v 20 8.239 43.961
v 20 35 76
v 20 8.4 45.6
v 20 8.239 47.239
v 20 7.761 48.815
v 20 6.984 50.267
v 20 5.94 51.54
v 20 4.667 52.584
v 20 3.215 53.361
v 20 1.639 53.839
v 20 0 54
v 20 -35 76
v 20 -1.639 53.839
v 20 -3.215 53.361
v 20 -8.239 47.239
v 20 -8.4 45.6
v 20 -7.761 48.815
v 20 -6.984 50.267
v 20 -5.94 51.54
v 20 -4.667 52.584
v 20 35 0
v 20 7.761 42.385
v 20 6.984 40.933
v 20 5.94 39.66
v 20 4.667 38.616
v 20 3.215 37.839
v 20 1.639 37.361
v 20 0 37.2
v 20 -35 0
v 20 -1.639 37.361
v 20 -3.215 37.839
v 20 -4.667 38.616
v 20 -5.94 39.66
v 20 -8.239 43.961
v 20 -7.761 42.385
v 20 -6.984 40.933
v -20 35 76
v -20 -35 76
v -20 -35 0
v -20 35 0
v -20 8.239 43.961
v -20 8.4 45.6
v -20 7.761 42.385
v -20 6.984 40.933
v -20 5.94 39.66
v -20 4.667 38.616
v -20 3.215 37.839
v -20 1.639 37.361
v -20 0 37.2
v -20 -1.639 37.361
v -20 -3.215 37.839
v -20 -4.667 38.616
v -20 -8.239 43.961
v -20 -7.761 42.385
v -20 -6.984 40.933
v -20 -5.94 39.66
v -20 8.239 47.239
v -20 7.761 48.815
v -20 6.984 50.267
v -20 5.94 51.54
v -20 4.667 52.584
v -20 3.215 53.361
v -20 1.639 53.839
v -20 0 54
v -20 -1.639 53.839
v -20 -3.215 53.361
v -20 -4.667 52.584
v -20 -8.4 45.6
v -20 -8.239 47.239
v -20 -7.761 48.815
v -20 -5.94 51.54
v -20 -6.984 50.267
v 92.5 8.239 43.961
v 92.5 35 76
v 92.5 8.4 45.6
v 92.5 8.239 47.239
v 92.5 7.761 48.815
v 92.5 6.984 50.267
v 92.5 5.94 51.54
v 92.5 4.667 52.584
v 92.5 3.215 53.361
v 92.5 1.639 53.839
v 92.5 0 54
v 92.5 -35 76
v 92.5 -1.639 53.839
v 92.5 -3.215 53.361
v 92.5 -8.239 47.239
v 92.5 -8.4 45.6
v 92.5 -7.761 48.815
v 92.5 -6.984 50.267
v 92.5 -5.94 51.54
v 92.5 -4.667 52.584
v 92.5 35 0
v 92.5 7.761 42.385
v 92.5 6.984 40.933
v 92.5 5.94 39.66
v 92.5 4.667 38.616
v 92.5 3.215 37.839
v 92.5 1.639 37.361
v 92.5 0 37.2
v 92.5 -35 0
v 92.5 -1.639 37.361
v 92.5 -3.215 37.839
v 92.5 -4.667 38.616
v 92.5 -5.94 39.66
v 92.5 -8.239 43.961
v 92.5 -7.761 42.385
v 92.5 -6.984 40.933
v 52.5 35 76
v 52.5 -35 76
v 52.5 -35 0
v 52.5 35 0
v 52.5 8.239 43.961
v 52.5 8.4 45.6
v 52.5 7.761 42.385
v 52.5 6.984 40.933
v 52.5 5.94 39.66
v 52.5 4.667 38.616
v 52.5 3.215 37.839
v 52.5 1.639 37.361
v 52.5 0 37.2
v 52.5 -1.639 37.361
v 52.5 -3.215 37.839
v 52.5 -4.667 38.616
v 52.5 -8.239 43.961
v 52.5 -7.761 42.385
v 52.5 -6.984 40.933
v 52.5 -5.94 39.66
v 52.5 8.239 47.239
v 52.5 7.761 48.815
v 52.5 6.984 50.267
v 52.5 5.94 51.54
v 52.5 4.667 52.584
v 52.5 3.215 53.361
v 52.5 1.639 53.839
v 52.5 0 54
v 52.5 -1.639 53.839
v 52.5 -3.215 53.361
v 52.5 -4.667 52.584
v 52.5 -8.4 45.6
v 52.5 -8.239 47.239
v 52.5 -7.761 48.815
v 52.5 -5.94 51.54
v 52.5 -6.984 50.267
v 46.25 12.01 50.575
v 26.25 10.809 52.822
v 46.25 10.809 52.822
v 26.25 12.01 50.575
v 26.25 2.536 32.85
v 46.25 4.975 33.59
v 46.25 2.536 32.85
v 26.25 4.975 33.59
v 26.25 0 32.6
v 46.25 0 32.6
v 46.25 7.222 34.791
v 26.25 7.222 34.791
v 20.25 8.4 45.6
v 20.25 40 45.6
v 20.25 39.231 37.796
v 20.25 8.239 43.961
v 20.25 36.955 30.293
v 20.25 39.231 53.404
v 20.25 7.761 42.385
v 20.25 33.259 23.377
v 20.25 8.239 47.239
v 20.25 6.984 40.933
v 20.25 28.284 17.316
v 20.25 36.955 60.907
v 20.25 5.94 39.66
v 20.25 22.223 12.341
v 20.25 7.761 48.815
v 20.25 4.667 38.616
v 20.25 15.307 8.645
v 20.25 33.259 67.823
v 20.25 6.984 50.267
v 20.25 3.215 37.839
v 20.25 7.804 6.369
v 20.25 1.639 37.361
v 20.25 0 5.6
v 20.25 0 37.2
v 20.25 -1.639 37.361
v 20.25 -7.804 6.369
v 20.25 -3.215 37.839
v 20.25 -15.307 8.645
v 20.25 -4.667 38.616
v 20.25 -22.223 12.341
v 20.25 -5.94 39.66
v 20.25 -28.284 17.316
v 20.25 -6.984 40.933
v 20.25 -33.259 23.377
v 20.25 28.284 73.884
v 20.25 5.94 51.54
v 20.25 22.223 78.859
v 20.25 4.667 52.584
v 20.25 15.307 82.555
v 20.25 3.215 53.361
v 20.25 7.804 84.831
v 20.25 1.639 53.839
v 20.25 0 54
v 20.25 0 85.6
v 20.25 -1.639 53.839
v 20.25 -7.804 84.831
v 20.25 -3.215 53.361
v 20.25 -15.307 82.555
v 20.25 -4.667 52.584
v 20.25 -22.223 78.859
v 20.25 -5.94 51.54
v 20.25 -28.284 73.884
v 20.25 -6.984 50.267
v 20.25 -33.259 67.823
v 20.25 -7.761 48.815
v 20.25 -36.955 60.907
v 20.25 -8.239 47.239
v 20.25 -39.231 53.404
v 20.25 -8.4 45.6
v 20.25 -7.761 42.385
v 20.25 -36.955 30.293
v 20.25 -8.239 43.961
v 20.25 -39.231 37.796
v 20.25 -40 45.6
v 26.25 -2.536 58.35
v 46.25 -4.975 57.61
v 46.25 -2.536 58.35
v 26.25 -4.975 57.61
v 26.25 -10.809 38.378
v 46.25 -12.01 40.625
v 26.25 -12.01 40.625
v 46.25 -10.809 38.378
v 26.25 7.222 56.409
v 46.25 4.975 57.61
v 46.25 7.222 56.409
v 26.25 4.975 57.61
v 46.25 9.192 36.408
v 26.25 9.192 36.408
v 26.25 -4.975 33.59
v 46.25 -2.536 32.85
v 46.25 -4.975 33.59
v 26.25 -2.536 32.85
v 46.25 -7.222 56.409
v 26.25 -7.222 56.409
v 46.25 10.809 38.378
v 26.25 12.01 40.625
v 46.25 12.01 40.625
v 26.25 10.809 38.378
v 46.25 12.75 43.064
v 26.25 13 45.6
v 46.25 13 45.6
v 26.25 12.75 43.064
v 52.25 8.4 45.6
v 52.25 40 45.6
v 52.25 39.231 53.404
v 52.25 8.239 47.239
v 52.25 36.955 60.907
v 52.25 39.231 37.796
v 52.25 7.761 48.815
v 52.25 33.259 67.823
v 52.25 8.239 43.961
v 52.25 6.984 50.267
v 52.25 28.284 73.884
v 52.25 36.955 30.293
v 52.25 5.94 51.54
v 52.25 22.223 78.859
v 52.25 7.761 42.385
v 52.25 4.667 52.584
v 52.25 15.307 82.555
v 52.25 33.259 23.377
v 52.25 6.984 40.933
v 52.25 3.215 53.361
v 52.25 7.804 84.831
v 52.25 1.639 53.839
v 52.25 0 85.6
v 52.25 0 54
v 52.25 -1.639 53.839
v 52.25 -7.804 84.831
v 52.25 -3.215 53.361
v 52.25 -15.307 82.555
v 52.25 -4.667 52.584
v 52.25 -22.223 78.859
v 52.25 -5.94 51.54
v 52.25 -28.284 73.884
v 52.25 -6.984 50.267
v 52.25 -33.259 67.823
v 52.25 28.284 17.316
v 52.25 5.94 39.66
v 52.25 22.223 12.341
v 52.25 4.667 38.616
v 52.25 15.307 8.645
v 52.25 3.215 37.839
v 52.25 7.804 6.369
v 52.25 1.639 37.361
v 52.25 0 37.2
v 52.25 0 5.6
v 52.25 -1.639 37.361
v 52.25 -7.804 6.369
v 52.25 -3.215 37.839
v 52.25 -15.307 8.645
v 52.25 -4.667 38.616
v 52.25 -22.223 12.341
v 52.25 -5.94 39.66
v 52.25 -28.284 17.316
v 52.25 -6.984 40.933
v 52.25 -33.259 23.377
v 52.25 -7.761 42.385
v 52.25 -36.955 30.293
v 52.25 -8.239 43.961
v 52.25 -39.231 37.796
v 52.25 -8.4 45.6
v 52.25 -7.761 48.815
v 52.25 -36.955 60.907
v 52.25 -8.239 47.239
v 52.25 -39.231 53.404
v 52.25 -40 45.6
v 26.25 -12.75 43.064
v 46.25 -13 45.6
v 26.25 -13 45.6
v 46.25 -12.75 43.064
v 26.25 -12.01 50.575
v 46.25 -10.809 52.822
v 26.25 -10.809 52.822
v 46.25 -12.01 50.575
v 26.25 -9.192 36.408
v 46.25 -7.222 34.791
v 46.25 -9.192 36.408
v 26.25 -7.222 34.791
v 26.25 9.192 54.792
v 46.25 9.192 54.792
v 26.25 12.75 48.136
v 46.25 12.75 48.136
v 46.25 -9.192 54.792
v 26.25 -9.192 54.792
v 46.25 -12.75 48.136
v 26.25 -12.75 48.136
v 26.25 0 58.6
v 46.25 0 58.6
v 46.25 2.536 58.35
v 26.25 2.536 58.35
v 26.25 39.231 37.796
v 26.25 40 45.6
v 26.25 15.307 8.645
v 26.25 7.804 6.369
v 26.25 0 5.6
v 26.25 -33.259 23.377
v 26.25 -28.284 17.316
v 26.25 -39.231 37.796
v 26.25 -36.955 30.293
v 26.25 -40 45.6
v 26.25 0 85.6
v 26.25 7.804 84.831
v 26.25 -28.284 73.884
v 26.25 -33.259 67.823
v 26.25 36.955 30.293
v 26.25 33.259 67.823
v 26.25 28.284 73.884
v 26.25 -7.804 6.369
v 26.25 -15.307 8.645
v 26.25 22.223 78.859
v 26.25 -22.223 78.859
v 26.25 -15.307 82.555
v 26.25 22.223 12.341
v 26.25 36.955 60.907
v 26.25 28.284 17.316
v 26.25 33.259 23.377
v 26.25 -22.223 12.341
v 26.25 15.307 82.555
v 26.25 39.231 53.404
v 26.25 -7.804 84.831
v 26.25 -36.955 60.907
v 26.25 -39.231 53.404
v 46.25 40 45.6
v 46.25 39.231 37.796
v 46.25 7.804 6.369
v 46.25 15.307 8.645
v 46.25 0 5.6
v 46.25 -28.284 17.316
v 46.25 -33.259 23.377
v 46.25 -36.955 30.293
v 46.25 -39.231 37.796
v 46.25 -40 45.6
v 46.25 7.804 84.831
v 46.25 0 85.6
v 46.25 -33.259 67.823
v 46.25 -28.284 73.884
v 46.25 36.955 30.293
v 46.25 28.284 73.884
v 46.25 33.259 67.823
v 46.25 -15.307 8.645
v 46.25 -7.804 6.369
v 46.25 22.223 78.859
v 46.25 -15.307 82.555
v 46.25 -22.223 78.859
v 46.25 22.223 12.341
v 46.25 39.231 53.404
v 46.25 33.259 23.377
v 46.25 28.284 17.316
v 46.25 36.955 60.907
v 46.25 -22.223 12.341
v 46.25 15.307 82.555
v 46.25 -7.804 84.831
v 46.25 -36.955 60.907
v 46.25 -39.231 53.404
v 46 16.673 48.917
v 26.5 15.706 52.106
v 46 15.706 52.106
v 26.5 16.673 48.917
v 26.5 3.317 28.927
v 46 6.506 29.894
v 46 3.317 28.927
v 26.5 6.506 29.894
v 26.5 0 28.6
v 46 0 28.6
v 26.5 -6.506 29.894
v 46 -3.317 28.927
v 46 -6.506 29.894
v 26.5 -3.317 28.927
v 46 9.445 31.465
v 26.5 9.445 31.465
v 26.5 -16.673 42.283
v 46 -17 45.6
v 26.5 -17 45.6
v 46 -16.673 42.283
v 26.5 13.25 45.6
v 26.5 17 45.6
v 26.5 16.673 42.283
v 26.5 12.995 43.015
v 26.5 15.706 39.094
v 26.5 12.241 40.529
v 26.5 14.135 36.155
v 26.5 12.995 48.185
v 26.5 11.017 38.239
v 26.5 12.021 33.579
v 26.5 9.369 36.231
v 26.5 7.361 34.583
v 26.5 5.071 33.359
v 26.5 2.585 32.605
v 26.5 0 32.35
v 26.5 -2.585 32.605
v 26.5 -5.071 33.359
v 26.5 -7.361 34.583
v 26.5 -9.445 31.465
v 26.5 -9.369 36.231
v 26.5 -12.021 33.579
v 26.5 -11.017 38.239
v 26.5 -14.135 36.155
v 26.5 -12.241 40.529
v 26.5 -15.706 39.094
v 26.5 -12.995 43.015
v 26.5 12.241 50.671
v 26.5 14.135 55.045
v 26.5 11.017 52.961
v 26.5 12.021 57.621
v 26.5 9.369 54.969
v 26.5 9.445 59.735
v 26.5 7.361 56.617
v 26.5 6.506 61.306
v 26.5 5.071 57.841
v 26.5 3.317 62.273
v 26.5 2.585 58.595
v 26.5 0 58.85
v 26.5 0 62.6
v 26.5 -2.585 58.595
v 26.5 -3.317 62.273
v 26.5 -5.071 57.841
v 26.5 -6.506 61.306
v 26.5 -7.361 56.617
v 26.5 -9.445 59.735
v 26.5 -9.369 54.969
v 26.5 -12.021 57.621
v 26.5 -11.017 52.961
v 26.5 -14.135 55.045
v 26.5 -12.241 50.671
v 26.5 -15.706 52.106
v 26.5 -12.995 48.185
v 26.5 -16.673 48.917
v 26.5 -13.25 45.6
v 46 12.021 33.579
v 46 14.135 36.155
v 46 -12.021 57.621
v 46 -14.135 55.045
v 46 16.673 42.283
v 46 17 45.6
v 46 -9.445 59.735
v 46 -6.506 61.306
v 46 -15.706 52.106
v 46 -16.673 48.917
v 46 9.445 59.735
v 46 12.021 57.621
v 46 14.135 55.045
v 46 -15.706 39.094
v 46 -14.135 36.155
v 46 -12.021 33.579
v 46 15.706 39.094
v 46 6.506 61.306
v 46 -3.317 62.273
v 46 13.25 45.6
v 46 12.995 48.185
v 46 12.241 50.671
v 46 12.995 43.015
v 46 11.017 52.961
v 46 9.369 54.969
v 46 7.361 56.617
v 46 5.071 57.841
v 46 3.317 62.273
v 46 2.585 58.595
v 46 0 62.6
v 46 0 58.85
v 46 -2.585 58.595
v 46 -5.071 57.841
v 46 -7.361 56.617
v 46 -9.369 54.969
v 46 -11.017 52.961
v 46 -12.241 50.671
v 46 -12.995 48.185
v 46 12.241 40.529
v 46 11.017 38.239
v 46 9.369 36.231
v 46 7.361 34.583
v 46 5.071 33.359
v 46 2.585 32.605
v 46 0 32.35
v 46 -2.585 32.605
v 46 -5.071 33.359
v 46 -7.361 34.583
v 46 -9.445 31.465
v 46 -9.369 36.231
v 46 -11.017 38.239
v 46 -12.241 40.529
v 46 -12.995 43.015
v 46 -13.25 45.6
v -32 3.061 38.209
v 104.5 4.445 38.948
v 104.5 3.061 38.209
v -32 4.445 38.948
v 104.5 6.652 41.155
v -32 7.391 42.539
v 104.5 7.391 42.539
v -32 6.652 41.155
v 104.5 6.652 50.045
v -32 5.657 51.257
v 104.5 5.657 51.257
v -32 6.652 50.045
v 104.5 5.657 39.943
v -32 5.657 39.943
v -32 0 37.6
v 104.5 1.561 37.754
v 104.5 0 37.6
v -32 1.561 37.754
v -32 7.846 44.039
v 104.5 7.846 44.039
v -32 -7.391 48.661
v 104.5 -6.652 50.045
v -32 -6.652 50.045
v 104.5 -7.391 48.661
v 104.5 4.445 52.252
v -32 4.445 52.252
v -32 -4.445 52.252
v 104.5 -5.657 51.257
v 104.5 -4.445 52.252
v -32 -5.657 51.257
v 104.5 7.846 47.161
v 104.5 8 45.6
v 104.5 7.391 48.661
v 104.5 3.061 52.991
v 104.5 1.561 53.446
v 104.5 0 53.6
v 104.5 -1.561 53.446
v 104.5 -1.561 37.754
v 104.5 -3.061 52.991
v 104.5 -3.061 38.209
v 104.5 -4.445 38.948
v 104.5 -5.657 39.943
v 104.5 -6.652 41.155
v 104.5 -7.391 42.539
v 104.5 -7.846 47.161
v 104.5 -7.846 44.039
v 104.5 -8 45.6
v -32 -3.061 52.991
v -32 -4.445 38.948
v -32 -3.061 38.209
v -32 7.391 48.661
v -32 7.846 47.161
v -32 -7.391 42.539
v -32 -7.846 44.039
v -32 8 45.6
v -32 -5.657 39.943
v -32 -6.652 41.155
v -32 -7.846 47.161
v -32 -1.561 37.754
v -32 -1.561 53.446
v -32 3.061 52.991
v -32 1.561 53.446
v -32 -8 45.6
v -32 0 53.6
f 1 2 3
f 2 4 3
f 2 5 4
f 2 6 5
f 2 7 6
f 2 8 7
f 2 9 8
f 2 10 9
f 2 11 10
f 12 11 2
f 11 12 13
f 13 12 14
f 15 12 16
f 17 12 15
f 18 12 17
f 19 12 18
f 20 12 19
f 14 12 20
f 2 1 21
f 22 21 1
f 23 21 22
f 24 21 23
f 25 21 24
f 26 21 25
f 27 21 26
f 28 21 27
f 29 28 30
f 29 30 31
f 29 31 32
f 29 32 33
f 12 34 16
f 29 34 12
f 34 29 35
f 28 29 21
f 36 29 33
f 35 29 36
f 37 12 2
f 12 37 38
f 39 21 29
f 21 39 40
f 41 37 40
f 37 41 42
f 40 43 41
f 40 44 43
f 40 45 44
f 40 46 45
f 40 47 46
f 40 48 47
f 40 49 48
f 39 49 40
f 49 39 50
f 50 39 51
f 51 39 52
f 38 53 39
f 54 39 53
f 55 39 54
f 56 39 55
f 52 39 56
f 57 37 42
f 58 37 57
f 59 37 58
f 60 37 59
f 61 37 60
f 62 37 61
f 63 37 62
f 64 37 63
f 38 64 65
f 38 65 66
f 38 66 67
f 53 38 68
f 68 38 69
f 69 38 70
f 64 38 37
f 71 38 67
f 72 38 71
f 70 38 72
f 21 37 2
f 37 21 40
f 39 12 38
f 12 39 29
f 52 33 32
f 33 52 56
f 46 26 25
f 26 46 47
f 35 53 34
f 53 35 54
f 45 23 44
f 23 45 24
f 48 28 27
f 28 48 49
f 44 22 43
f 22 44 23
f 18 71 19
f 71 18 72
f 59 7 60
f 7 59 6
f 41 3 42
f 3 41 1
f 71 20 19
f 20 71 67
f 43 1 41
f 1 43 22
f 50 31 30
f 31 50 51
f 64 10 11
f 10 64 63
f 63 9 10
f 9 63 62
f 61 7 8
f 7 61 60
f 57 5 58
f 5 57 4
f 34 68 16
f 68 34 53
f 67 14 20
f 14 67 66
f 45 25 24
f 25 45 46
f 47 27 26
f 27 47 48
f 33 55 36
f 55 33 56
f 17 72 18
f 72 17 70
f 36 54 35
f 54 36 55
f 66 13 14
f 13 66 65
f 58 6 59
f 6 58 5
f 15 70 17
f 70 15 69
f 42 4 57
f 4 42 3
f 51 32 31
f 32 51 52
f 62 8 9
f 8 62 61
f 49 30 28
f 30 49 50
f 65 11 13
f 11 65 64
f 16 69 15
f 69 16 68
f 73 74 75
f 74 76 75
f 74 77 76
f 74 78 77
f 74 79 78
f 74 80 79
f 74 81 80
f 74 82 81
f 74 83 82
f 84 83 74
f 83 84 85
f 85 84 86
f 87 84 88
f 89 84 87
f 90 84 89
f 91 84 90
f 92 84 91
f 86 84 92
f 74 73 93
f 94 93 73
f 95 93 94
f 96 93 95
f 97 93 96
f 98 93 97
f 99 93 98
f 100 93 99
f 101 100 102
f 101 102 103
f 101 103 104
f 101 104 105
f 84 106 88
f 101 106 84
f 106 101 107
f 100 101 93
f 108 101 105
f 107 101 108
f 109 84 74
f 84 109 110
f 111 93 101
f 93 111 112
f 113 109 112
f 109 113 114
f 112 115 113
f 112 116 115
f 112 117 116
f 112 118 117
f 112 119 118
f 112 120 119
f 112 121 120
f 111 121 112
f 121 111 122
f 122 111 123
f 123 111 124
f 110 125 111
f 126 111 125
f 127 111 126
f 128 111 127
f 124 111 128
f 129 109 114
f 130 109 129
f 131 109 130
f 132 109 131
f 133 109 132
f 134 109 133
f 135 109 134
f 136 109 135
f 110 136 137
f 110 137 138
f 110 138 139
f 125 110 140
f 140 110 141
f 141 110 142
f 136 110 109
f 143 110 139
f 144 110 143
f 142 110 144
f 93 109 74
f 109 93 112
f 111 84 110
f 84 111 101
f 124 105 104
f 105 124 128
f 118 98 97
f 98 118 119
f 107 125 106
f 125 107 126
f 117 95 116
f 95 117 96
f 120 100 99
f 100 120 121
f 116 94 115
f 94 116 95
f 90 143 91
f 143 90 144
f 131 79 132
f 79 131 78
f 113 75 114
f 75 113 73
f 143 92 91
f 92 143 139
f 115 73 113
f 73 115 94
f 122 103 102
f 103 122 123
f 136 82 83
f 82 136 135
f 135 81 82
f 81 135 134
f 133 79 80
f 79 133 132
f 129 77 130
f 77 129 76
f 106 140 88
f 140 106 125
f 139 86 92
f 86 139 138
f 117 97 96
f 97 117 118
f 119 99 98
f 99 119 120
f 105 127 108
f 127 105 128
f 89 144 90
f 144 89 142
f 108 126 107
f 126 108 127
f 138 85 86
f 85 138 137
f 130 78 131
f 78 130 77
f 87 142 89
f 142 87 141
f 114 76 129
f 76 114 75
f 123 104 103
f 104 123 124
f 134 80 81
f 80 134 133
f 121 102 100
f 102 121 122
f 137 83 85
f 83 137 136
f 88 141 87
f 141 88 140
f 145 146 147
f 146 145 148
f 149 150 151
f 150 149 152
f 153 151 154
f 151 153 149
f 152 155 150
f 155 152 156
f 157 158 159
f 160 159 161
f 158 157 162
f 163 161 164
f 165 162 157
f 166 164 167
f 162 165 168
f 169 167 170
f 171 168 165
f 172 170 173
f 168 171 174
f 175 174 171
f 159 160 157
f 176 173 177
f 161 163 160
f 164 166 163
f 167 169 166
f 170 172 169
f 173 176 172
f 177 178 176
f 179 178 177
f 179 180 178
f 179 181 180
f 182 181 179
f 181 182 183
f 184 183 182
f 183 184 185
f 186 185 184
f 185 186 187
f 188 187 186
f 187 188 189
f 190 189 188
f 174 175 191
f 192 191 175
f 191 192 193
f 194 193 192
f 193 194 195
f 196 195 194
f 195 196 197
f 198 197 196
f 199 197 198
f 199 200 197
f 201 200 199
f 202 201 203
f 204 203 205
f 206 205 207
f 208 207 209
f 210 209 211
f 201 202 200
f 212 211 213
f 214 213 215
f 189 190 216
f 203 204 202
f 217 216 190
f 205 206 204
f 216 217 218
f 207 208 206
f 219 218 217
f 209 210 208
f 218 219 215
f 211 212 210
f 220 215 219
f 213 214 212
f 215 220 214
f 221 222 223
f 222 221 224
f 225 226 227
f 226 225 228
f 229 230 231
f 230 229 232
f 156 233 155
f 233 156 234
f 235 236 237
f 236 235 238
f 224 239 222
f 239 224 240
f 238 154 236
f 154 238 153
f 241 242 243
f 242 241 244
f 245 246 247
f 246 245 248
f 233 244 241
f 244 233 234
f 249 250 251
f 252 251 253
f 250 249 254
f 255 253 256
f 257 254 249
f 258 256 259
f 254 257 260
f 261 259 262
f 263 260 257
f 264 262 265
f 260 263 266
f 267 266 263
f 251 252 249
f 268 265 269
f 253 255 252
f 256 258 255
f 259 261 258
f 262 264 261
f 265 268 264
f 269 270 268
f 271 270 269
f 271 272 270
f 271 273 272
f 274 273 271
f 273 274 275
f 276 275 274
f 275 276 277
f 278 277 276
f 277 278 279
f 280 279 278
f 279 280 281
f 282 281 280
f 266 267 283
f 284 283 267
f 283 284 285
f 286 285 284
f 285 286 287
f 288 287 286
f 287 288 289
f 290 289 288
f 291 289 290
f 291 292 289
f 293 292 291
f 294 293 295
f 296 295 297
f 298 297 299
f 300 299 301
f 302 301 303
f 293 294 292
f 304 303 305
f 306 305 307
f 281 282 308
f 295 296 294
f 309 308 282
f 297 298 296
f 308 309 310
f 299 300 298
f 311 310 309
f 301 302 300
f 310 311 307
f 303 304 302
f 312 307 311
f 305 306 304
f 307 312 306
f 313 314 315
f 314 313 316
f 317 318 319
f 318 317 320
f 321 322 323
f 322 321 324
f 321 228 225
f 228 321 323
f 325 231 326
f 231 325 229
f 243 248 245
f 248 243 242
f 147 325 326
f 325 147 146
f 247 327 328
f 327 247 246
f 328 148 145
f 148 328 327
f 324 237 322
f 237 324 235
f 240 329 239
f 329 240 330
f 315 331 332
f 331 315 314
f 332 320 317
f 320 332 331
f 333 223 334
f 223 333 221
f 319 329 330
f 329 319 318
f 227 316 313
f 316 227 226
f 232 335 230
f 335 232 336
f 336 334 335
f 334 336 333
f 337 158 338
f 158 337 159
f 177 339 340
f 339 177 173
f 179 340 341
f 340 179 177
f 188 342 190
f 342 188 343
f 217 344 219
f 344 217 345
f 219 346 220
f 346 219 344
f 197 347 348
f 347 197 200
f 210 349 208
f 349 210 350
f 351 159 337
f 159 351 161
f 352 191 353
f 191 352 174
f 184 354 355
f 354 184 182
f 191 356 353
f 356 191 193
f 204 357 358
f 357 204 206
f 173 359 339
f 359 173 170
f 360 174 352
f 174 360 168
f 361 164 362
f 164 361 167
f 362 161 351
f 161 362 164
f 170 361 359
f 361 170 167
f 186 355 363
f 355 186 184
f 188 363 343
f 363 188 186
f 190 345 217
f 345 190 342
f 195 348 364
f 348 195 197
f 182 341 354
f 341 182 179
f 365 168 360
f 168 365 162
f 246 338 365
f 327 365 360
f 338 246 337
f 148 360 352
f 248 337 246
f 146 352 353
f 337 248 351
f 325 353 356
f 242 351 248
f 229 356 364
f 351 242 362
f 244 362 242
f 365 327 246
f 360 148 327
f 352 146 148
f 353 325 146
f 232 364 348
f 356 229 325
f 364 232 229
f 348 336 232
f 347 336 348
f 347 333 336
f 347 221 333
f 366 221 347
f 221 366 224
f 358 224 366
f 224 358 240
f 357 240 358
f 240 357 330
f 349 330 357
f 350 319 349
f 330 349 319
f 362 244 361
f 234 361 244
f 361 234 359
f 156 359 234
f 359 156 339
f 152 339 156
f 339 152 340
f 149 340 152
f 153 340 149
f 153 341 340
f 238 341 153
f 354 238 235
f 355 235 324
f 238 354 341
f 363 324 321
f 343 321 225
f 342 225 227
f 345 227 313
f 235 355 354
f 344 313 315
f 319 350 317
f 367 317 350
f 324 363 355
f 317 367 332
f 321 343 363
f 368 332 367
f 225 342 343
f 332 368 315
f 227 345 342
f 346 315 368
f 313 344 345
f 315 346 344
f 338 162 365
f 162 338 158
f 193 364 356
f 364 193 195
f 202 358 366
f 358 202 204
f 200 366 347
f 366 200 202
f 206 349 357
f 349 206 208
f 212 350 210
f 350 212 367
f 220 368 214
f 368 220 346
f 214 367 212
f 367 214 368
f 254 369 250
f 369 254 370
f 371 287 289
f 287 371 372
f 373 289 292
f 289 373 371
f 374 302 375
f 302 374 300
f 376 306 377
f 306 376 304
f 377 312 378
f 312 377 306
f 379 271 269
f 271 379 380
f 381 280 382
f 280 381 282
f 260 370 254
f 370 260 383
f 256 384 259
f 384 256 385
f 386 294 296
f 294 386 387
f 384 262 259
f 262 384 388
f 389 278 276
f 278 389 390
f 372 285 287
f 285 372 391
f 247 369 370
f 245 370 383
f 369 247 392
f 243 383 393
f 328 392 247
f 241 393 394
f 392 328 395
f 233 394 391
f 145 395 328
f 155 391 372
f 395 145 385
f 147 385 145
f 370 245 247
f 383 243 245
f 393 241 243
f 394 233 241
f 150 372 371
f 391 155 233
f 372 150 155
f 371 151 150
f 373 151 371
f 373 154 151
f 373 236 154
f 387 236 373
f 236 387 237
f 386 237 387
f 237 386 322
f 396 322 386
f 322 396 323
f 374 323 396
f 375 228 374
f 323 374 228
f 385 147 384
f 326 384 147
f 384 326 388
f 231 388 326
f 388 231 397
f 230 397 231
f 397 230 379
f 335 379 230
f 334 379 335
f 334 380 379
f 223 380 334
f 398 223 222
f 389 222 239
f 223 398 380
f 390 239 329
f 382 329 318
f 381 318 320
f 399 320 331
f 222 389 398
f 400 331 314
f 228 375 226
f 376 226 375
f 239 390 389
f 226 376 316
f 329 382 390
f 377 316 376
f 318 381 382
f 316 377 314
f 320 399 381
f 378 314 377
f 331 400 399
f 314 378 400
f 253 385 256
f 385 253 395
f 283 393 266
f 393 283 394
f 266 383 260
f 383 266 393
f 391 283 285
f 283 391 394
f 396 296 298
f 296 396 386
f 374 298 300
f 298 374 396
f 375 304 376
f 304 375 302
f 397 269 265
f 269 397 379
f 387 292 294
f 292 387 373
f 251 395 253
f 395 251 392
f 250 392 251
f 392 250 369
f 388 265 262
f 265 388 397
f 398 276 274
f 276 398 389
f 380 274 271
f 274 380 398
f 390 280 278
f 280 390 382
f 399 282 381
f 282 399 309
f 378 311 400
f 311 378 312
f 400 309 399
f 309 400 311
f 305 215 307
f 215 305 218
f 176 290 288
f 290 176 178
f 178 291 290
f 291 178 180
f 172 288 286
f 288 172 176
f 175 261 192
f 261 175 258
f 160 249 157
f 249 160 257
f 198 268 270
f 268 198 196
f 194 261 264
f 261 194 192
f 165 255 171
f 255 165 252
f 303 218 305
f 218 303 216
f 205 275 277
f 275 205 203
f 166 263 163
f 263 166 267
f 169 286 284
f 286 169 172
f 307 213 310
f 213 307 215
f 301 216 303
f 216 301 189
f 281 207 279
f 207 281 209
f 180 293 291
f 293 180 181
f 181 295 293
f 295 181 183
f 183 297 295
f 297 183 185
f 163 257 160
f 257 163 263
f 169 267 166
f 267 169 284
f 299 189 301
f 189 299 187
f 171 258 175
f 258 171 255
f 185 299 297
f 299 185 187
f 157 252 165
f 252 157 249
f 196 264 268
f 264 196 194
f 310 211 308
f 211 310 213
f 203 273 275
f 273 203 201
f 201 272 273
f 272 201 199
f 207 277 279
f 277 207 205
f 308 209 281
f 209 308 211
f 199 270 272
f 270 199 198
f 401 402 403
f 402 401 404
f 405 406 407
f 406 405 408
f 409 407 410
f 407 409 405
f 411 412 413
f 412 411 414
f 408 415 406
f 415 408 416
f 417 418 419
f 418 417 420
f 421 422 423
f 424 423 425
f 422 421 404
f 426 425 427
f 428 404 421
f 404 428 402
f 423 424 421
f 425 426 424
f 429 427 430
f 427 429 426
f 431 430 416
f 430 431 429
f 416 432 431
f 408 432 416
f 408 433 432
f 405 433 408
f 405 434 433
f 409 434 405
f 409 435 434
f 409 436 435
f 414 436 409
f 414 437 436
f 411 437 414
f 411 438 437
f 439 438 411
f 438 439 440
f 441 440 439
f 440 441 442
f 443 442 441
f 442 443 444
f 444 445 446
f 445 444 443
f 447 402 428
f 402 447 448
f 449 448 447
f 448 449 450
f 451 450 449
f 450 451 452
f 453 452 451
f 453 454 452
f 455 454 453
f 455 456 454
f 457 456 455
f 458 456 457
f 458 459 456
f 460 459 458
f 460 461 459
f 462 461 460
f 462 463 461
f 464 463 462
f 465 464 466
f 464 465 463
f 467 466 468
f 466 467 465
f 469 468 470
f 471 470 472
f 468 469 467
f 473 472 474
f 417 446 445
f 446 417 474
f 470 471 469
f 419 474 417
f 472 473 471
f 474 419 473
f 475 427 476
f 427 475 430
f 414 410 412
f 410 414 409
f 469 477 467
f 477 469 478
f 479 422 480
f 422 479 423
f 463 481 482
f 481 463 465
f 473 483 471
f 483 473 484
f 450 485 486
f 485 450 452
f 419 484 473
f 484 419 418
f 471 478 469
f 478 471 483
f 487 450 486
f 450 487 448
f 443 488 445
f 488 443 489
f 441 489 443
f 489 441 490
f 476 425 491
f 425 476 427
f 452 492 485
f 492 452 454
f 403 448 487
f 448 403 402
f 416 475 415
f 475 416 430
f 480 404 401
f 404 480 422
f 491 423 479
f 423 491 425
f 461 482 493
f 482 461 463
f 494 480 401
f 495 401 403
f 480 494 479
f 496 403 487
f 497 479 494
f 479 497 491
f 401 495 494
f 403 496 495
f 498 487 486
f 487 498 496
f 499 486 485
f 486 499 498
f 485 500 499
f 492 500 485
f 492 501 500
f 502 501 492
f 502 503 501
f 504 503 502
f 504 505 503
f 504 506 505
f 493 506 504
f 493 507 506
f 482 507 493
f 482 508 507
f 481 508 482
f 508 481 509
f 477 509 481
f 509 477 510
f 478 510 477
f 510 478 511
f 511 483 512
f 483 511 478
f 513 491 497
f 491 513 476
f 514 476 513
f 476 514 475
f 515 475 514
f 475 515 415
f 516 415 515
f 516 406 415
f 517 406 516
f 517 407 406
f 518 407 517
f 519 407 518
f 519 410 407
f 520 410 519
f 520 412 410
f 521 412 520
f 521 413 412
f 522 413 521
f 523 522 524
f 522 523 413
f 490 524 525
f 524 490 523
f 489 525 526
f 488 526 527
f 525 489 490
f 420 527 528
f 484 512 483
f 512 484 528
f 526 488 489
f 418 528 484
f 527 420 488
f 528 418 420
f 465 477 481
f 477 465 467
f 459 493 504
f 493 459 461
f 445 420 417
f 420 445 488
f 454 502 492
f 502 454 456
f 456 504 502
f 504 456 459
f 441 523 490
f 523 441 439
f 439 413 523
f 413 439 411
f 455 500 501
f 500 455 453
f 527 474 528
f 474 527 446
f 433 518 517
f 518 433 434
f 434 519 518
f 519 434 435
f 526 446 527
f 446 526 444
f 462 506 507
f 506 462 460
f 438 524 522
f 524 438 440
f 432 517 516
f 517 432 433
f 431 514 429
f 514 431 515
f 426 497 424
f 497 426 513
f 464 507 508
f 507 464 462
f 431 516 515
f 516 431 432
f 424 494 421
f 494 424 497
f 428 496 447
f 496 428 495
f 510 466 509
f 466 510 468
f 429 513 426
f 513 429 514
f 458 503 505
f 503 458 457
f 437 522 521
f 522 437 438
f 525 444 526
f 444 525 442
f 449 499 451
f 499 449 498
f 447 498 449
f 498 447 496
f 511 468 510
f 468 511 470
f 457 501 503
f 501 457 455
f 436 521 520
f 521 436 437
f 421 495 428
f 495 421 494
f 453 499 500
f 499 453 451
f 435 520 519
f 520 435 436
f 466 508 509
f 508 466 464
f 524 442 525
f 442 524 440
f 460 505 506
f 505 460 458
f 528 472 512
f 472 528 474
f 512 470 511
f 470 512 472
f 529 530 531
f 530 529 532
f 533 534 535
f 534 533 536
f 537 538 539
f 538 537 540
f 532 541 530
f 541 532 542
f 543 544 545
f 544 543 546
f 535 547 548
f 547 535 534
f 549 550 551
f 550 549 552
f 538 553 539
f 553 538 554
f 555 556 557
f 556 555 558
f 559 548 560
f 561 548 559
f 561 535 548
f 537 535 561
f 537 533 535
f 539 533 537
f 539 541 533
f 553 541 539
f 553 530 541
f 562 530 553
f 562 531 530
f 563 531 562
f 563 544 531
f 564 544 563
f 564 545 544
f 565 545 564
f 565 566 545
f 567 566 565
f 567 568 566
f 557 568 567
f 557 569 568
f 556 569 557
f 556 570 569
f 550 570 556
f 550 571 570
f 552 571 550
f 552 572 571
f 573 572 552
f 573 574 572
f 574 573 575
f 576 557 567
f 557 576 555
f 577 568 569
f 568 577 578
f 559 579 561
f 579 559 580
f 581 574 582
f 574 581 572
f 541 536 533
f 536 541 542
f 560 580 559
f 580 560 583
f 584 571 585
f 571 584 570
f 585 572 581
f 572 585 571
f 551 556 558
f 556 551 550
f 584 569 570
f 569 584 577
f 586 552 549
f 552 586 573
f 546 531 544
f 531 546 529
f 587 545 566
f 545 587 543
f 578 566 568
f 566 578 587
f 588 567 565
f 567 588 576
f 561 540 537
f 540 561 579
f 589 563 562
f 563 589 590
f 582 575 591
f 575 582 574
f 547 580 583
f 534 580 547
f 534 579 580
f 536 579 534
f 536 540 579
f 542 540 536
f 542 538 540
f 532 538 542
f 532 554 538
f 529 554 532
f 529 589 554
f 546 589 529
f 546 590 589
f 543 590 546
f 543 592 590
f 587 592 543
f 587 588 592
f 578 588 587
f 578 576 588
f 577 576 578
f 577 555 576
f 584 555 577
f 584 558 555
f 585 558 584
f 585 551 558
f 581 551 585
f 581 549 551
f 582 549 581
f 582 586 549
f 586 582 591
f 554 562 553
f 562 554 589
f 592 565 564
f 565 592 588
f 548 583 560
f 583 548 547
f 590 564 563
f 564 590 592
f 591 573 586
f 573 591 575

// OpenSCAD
$fn = 32;

// ------------------------------------------------------------------------
// Pulley assembly: d80 pulley with a belt, shaft d16
// Every part is its own module, assembly() places them once.
// ------------------------------------------------------------------------

// --- part 1 ---
module support1() {
  difference() {
    translate([-20, -35, 0]) cube([40, 70, 76]);
    translate([0, 0, 45.6]) rotate([0, 90, 0]) cylinder(h = 42, d = 16.8, center = true);
  }
}

// --- part 2 ---
module support2() {
  difference() {
    translate([-20, -35, 0]) cube([40, 70, 76]);
    translate([0, 0, 45.6]) rotate([0, 90, 0]) cylinder(h = 42, d = 16.8, center = true);
  }
}

// --- part 3 ---
module shaft() {
  translate([0, 0, -68.25]) cylinder(h = 136.5, d = 16);
}

// --- part 4 ---
module pulley() {
  difference() {
    union() {
      cylinder(h = 32, d = 26);
      cylinder(h = 6, d = 80);
      translate([0, 0, 26]) cylinder(h = 6, d = 80);
    }
    translate([0, 0, -1]) cylinder(h = 34, d = 16.8);
  }
}

// --- part 5 ---
module belt() {
  difference() {
      translate([0, 0, 0]) cylinder(h = 19.5, d = 34);
      translate([0, 0, -1]) cylinder(h = 21.5, d = 26.5);
    }
}

// --- assembly ---
module assembly() {
  translate([0, 0, 0]) rotate([0, 0, 0]) support1();
  translate([72.5, 0, 0]) rotate([0, 0, 0]) support2();
  translate([36.25, 0, 45.6]) rotate([0, 90, 0]) shaft();
  translate([20.25, 0, 45.6]) rotate([0, 90, 0]) pulley();
  translate([26.5, 0, 45.6]) rotate([0, 90, 0]) belt();
}

assembly();
